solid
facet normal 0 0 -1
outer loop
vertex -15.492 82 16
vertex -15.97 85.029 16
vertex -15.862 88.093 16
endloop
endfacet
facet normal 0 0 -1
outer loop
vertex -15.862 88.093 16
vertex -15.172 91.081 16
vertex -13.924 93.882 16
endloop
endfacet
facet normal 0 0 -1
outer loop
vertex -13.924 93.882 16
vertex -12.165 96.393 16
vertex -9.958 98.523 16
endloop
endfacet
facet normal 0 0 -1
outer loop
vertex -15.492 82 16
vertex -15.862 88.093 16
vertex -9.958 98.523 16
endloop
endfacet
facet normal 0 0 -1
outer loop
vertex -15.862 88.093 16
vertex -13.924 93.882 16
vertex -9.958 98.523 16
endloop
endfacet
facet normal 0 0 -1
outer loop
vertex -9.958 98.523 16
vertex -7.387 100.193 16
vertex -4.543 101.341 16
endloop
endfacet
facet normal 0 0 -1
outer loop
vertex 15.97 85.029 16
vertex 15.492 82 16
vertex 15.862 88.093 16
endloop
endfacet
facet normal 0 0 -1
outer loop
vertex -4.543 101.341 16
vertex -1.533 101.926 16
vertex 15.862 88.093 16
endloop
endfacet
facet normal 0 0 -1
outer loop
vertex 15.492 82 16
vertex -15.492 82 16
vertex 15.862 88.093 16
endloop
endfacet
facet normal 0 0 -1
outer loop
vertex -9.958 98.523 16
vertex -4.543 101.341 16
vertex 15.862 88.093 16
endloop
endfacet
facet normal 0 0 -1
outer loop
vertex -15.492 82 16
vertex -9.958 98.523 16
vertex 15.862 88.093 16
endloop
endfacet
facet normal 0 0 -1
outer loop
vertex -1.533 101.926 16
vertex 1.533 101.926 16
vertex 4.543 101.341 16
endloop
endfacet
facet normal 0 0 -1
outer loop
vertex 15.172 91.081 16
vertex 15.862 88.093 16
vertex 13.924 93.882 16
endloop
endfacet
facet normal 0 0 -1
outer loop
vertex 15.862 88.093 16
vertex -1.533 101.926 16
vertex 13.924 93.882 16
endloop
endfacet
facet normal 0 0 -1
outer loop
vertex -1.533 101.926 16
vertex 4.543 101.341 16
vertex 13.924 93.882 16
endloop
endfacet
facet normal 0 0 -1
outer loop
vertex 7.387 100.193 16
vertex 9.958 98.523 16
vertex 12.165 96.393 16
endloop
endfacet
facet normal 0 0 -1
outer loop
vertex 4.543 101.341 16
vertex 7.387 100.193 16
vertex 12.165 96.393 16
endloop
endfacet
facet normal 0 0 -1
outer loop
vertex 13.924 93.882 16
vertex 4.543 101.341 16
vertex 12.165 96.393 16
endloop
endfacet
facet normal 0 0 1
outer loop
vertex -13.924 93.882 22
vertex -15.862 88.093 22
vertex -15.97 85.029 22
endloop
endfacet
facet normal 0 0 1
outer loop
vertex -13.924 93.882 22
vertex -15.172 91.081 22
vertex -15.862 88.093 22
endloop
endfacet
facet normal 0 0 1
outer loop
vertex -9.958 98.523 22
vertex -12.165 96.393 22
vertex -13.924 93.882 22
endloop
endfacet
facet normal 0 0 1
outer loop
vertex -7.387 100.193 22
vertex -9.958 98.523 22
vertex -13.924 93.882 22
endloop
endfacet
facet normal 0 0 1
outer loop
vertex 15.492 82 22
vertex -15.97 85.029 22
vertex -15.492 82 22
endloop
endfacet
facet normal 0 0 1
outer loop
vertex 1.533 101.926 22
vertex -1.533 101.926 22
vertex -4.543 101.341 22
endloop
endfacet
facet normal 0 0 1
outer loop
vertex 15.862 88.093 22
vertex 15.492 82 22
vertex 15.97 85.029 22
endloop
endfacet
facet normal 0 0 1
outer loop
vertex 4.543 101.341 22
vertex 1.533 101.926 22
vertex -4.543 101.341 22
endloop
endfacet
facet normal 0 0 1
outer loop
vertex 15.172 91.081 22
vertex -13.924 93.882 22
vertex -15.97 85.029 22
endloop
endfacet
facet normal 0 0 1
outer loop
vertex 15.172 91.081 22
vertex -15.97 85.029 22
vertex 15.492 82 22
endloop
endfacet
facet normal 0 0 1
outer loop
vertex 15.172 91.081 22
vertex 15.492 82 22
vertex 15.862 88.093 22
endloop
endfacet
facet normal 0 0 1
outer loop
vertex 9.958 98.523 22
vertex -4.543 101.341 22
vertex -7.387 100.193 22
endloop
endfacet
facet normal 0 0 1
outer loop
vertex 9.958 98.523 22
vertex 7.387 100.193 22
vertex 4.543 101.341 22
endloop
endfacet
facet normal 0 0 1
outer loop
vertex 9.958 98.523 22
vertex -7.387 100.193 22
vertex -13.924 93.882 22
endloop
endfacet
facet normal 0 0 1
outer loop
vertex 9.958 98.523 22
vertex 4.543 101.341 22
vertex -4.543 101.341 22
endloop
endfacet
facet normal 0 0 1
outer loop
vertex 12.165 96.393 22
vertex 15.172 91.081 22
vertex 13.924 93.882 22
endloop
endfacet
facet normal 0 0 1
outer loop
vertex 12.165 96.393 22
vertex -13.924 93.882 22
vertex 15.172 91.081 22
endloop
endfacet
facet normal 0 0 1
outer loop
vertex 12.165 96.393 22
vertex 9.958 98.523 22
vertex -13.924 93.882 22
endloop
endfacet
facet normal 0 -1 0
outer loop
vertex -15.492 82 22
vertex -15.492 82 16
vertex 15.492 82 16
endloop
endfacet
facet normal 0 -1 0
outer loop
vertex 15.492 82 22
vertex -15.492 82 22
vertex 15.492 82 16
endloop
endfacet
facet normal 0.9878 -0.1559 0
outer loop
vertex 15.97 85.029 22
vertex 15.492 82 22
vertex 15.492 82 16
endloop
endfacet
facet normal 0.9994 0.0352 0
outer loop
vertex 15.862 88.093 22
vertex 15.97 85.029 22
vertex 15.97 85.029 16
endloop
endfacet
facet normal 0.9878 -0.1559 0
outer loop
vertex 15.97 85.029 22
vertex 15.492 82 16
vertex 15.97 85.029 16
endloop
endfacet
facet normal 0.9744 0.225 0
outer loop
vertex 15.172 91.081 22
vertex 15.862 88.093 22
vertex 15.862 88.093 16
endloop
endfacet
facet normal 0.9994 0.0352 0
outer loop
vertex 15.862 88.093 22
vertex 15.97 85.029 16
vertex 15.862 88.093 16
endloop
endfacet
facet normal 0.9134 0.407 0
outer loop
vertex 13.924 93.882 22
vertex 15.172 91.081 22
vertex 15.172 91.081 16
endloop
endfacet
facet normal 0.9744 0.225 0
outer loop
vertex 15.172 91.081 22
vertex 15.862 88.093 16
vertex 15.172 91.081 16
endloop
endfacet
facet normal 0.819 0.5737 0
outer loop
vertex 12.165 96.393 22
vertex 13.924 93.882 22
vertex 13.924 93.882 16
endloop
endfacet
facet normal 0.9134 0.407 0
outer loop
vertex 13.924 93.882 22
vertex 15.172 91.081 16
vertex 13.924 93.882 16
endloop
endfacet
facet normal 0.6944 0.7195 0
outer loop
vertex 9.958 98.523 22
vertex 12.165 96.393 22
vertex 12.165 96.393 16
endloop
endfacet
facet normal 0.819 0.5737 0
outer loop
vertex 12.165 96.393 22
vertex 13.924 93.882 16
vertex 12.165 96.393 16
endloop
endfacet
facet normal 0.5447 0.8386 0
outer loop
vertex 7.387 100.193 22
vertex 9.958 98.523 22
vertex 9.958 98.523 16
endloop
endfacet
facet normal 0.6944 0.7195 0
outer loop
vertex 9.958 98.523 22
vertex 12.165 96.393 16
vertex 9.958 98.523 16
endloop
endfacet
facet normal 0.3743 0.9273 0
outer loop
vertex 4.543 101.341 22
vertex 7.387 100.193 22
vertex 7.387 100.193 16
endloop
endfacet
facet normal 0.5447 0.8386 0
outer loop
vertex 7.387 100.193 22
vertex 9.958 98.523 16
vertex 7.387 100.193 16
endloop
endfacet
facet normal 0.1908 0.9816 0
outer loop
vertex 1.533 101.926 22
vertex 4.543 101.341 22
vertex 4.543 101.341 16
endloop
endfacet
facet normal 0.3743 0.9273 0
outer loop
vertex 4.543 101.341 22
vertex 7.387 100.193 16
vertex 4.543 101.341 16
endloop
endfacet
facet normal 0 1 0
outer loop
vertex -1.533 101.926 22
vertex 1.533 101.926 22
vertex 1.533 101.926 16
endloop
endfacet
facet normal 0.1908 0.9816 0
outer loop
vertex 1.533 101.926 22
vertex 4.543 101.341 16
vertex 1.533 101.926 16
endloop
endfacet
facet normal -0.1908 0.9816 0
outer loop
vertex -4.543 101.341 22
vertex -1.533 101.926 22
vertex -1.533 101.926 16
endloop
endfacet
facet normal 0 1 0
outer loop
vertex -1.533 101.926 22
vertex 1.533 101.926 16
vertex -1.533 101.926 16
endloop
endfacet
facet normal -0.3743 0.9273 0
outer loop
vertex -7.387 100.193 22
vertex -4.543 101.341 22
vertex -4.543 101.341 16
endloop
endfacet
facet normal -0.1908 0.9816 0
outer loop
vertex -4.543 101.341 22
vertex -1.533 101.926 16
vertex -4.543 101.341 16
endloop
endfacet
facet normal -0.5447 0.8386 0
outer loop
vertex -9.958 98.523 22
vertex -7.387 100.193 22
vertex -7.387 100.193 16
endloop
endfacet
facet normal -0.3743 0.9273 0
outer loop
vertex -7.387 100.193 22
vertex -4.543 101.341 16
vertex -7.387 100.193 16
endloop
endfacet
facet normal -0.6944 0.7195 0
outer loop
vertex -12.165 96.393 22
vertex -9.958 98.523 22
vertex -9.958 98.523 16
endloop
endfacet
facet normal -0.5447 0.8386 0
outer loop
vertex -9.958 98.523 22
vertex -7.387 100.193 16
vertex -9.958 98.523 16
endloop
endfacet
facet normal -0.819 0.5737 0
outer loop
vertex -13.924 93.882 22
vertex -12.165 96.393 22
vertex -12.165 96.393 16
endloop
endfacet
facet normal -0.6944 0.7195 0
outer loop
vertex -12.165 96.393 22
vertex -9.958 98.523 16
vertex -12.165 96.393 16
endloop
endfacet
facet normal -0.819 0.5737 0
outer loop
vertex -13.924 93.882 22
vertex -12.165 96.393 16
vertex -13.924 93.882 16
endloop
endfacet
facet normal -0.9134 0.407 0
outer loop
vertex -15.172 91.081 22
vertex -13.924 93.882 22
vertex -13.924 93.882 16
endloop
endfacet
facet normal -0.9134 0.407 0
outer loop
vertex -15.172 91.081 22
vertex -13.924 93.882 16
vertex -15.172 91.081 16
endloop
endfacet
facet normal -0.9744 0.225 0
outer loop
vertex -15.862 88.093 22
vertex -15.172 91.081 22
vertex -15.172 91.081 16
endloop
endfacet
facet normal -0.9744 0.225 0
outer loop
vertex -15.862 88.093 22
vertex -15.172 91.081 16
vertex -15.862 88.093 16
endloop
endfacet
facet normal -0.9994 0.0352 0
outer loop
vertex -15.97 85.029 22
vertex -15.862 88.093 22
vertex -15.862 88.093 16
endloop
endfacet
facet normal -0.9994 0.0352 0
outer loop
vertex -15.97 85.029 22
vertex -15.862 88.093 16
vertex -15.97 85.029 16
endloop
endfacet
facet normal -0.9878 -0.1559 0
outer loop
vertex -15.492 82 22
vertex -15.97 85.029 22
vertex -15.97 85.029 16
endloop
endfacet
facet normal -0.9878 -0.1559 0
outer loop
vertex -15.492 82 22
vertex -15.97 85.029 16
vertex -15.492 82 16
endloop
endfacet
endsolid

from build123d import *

# Parameters (mm, degrees)
BOX251_W          = 148
BOX251_H          = 40
BOX251_DEPTH      = 40
CYLINDER674_R     = 16
CYLINDER674_DEPTH = 6


with BuildPart() as krychle251:
    # Box251 → Box251 (new body)
    with BuildSketch(Plane(origin=(-74, 42, 16), x_dir=(1, 0, 0), z_dir=(0, 0, 1))):
        with Locations((74, 20)):
            Rectangle(BOX251_W, BOX251_H)
    extrude(amount=BOX251_DEPTH)


with BuildPart() as cut268:
    # Cylinder674 → Cylinder674 (new body)
    with BuildSketch(Plane(origin=(0, 86, 16), x_dir=(1, 0, 0), z_dir=(0, 0, 1))):
        Circle(CYLINDER674_R)
    extrude(amount=CYLINDER674_DEPTH)

    # Cut268: cut Krychle251
    add(krychle251.part, mode=Mode.SUBTRACT)


solid = cut268.part
